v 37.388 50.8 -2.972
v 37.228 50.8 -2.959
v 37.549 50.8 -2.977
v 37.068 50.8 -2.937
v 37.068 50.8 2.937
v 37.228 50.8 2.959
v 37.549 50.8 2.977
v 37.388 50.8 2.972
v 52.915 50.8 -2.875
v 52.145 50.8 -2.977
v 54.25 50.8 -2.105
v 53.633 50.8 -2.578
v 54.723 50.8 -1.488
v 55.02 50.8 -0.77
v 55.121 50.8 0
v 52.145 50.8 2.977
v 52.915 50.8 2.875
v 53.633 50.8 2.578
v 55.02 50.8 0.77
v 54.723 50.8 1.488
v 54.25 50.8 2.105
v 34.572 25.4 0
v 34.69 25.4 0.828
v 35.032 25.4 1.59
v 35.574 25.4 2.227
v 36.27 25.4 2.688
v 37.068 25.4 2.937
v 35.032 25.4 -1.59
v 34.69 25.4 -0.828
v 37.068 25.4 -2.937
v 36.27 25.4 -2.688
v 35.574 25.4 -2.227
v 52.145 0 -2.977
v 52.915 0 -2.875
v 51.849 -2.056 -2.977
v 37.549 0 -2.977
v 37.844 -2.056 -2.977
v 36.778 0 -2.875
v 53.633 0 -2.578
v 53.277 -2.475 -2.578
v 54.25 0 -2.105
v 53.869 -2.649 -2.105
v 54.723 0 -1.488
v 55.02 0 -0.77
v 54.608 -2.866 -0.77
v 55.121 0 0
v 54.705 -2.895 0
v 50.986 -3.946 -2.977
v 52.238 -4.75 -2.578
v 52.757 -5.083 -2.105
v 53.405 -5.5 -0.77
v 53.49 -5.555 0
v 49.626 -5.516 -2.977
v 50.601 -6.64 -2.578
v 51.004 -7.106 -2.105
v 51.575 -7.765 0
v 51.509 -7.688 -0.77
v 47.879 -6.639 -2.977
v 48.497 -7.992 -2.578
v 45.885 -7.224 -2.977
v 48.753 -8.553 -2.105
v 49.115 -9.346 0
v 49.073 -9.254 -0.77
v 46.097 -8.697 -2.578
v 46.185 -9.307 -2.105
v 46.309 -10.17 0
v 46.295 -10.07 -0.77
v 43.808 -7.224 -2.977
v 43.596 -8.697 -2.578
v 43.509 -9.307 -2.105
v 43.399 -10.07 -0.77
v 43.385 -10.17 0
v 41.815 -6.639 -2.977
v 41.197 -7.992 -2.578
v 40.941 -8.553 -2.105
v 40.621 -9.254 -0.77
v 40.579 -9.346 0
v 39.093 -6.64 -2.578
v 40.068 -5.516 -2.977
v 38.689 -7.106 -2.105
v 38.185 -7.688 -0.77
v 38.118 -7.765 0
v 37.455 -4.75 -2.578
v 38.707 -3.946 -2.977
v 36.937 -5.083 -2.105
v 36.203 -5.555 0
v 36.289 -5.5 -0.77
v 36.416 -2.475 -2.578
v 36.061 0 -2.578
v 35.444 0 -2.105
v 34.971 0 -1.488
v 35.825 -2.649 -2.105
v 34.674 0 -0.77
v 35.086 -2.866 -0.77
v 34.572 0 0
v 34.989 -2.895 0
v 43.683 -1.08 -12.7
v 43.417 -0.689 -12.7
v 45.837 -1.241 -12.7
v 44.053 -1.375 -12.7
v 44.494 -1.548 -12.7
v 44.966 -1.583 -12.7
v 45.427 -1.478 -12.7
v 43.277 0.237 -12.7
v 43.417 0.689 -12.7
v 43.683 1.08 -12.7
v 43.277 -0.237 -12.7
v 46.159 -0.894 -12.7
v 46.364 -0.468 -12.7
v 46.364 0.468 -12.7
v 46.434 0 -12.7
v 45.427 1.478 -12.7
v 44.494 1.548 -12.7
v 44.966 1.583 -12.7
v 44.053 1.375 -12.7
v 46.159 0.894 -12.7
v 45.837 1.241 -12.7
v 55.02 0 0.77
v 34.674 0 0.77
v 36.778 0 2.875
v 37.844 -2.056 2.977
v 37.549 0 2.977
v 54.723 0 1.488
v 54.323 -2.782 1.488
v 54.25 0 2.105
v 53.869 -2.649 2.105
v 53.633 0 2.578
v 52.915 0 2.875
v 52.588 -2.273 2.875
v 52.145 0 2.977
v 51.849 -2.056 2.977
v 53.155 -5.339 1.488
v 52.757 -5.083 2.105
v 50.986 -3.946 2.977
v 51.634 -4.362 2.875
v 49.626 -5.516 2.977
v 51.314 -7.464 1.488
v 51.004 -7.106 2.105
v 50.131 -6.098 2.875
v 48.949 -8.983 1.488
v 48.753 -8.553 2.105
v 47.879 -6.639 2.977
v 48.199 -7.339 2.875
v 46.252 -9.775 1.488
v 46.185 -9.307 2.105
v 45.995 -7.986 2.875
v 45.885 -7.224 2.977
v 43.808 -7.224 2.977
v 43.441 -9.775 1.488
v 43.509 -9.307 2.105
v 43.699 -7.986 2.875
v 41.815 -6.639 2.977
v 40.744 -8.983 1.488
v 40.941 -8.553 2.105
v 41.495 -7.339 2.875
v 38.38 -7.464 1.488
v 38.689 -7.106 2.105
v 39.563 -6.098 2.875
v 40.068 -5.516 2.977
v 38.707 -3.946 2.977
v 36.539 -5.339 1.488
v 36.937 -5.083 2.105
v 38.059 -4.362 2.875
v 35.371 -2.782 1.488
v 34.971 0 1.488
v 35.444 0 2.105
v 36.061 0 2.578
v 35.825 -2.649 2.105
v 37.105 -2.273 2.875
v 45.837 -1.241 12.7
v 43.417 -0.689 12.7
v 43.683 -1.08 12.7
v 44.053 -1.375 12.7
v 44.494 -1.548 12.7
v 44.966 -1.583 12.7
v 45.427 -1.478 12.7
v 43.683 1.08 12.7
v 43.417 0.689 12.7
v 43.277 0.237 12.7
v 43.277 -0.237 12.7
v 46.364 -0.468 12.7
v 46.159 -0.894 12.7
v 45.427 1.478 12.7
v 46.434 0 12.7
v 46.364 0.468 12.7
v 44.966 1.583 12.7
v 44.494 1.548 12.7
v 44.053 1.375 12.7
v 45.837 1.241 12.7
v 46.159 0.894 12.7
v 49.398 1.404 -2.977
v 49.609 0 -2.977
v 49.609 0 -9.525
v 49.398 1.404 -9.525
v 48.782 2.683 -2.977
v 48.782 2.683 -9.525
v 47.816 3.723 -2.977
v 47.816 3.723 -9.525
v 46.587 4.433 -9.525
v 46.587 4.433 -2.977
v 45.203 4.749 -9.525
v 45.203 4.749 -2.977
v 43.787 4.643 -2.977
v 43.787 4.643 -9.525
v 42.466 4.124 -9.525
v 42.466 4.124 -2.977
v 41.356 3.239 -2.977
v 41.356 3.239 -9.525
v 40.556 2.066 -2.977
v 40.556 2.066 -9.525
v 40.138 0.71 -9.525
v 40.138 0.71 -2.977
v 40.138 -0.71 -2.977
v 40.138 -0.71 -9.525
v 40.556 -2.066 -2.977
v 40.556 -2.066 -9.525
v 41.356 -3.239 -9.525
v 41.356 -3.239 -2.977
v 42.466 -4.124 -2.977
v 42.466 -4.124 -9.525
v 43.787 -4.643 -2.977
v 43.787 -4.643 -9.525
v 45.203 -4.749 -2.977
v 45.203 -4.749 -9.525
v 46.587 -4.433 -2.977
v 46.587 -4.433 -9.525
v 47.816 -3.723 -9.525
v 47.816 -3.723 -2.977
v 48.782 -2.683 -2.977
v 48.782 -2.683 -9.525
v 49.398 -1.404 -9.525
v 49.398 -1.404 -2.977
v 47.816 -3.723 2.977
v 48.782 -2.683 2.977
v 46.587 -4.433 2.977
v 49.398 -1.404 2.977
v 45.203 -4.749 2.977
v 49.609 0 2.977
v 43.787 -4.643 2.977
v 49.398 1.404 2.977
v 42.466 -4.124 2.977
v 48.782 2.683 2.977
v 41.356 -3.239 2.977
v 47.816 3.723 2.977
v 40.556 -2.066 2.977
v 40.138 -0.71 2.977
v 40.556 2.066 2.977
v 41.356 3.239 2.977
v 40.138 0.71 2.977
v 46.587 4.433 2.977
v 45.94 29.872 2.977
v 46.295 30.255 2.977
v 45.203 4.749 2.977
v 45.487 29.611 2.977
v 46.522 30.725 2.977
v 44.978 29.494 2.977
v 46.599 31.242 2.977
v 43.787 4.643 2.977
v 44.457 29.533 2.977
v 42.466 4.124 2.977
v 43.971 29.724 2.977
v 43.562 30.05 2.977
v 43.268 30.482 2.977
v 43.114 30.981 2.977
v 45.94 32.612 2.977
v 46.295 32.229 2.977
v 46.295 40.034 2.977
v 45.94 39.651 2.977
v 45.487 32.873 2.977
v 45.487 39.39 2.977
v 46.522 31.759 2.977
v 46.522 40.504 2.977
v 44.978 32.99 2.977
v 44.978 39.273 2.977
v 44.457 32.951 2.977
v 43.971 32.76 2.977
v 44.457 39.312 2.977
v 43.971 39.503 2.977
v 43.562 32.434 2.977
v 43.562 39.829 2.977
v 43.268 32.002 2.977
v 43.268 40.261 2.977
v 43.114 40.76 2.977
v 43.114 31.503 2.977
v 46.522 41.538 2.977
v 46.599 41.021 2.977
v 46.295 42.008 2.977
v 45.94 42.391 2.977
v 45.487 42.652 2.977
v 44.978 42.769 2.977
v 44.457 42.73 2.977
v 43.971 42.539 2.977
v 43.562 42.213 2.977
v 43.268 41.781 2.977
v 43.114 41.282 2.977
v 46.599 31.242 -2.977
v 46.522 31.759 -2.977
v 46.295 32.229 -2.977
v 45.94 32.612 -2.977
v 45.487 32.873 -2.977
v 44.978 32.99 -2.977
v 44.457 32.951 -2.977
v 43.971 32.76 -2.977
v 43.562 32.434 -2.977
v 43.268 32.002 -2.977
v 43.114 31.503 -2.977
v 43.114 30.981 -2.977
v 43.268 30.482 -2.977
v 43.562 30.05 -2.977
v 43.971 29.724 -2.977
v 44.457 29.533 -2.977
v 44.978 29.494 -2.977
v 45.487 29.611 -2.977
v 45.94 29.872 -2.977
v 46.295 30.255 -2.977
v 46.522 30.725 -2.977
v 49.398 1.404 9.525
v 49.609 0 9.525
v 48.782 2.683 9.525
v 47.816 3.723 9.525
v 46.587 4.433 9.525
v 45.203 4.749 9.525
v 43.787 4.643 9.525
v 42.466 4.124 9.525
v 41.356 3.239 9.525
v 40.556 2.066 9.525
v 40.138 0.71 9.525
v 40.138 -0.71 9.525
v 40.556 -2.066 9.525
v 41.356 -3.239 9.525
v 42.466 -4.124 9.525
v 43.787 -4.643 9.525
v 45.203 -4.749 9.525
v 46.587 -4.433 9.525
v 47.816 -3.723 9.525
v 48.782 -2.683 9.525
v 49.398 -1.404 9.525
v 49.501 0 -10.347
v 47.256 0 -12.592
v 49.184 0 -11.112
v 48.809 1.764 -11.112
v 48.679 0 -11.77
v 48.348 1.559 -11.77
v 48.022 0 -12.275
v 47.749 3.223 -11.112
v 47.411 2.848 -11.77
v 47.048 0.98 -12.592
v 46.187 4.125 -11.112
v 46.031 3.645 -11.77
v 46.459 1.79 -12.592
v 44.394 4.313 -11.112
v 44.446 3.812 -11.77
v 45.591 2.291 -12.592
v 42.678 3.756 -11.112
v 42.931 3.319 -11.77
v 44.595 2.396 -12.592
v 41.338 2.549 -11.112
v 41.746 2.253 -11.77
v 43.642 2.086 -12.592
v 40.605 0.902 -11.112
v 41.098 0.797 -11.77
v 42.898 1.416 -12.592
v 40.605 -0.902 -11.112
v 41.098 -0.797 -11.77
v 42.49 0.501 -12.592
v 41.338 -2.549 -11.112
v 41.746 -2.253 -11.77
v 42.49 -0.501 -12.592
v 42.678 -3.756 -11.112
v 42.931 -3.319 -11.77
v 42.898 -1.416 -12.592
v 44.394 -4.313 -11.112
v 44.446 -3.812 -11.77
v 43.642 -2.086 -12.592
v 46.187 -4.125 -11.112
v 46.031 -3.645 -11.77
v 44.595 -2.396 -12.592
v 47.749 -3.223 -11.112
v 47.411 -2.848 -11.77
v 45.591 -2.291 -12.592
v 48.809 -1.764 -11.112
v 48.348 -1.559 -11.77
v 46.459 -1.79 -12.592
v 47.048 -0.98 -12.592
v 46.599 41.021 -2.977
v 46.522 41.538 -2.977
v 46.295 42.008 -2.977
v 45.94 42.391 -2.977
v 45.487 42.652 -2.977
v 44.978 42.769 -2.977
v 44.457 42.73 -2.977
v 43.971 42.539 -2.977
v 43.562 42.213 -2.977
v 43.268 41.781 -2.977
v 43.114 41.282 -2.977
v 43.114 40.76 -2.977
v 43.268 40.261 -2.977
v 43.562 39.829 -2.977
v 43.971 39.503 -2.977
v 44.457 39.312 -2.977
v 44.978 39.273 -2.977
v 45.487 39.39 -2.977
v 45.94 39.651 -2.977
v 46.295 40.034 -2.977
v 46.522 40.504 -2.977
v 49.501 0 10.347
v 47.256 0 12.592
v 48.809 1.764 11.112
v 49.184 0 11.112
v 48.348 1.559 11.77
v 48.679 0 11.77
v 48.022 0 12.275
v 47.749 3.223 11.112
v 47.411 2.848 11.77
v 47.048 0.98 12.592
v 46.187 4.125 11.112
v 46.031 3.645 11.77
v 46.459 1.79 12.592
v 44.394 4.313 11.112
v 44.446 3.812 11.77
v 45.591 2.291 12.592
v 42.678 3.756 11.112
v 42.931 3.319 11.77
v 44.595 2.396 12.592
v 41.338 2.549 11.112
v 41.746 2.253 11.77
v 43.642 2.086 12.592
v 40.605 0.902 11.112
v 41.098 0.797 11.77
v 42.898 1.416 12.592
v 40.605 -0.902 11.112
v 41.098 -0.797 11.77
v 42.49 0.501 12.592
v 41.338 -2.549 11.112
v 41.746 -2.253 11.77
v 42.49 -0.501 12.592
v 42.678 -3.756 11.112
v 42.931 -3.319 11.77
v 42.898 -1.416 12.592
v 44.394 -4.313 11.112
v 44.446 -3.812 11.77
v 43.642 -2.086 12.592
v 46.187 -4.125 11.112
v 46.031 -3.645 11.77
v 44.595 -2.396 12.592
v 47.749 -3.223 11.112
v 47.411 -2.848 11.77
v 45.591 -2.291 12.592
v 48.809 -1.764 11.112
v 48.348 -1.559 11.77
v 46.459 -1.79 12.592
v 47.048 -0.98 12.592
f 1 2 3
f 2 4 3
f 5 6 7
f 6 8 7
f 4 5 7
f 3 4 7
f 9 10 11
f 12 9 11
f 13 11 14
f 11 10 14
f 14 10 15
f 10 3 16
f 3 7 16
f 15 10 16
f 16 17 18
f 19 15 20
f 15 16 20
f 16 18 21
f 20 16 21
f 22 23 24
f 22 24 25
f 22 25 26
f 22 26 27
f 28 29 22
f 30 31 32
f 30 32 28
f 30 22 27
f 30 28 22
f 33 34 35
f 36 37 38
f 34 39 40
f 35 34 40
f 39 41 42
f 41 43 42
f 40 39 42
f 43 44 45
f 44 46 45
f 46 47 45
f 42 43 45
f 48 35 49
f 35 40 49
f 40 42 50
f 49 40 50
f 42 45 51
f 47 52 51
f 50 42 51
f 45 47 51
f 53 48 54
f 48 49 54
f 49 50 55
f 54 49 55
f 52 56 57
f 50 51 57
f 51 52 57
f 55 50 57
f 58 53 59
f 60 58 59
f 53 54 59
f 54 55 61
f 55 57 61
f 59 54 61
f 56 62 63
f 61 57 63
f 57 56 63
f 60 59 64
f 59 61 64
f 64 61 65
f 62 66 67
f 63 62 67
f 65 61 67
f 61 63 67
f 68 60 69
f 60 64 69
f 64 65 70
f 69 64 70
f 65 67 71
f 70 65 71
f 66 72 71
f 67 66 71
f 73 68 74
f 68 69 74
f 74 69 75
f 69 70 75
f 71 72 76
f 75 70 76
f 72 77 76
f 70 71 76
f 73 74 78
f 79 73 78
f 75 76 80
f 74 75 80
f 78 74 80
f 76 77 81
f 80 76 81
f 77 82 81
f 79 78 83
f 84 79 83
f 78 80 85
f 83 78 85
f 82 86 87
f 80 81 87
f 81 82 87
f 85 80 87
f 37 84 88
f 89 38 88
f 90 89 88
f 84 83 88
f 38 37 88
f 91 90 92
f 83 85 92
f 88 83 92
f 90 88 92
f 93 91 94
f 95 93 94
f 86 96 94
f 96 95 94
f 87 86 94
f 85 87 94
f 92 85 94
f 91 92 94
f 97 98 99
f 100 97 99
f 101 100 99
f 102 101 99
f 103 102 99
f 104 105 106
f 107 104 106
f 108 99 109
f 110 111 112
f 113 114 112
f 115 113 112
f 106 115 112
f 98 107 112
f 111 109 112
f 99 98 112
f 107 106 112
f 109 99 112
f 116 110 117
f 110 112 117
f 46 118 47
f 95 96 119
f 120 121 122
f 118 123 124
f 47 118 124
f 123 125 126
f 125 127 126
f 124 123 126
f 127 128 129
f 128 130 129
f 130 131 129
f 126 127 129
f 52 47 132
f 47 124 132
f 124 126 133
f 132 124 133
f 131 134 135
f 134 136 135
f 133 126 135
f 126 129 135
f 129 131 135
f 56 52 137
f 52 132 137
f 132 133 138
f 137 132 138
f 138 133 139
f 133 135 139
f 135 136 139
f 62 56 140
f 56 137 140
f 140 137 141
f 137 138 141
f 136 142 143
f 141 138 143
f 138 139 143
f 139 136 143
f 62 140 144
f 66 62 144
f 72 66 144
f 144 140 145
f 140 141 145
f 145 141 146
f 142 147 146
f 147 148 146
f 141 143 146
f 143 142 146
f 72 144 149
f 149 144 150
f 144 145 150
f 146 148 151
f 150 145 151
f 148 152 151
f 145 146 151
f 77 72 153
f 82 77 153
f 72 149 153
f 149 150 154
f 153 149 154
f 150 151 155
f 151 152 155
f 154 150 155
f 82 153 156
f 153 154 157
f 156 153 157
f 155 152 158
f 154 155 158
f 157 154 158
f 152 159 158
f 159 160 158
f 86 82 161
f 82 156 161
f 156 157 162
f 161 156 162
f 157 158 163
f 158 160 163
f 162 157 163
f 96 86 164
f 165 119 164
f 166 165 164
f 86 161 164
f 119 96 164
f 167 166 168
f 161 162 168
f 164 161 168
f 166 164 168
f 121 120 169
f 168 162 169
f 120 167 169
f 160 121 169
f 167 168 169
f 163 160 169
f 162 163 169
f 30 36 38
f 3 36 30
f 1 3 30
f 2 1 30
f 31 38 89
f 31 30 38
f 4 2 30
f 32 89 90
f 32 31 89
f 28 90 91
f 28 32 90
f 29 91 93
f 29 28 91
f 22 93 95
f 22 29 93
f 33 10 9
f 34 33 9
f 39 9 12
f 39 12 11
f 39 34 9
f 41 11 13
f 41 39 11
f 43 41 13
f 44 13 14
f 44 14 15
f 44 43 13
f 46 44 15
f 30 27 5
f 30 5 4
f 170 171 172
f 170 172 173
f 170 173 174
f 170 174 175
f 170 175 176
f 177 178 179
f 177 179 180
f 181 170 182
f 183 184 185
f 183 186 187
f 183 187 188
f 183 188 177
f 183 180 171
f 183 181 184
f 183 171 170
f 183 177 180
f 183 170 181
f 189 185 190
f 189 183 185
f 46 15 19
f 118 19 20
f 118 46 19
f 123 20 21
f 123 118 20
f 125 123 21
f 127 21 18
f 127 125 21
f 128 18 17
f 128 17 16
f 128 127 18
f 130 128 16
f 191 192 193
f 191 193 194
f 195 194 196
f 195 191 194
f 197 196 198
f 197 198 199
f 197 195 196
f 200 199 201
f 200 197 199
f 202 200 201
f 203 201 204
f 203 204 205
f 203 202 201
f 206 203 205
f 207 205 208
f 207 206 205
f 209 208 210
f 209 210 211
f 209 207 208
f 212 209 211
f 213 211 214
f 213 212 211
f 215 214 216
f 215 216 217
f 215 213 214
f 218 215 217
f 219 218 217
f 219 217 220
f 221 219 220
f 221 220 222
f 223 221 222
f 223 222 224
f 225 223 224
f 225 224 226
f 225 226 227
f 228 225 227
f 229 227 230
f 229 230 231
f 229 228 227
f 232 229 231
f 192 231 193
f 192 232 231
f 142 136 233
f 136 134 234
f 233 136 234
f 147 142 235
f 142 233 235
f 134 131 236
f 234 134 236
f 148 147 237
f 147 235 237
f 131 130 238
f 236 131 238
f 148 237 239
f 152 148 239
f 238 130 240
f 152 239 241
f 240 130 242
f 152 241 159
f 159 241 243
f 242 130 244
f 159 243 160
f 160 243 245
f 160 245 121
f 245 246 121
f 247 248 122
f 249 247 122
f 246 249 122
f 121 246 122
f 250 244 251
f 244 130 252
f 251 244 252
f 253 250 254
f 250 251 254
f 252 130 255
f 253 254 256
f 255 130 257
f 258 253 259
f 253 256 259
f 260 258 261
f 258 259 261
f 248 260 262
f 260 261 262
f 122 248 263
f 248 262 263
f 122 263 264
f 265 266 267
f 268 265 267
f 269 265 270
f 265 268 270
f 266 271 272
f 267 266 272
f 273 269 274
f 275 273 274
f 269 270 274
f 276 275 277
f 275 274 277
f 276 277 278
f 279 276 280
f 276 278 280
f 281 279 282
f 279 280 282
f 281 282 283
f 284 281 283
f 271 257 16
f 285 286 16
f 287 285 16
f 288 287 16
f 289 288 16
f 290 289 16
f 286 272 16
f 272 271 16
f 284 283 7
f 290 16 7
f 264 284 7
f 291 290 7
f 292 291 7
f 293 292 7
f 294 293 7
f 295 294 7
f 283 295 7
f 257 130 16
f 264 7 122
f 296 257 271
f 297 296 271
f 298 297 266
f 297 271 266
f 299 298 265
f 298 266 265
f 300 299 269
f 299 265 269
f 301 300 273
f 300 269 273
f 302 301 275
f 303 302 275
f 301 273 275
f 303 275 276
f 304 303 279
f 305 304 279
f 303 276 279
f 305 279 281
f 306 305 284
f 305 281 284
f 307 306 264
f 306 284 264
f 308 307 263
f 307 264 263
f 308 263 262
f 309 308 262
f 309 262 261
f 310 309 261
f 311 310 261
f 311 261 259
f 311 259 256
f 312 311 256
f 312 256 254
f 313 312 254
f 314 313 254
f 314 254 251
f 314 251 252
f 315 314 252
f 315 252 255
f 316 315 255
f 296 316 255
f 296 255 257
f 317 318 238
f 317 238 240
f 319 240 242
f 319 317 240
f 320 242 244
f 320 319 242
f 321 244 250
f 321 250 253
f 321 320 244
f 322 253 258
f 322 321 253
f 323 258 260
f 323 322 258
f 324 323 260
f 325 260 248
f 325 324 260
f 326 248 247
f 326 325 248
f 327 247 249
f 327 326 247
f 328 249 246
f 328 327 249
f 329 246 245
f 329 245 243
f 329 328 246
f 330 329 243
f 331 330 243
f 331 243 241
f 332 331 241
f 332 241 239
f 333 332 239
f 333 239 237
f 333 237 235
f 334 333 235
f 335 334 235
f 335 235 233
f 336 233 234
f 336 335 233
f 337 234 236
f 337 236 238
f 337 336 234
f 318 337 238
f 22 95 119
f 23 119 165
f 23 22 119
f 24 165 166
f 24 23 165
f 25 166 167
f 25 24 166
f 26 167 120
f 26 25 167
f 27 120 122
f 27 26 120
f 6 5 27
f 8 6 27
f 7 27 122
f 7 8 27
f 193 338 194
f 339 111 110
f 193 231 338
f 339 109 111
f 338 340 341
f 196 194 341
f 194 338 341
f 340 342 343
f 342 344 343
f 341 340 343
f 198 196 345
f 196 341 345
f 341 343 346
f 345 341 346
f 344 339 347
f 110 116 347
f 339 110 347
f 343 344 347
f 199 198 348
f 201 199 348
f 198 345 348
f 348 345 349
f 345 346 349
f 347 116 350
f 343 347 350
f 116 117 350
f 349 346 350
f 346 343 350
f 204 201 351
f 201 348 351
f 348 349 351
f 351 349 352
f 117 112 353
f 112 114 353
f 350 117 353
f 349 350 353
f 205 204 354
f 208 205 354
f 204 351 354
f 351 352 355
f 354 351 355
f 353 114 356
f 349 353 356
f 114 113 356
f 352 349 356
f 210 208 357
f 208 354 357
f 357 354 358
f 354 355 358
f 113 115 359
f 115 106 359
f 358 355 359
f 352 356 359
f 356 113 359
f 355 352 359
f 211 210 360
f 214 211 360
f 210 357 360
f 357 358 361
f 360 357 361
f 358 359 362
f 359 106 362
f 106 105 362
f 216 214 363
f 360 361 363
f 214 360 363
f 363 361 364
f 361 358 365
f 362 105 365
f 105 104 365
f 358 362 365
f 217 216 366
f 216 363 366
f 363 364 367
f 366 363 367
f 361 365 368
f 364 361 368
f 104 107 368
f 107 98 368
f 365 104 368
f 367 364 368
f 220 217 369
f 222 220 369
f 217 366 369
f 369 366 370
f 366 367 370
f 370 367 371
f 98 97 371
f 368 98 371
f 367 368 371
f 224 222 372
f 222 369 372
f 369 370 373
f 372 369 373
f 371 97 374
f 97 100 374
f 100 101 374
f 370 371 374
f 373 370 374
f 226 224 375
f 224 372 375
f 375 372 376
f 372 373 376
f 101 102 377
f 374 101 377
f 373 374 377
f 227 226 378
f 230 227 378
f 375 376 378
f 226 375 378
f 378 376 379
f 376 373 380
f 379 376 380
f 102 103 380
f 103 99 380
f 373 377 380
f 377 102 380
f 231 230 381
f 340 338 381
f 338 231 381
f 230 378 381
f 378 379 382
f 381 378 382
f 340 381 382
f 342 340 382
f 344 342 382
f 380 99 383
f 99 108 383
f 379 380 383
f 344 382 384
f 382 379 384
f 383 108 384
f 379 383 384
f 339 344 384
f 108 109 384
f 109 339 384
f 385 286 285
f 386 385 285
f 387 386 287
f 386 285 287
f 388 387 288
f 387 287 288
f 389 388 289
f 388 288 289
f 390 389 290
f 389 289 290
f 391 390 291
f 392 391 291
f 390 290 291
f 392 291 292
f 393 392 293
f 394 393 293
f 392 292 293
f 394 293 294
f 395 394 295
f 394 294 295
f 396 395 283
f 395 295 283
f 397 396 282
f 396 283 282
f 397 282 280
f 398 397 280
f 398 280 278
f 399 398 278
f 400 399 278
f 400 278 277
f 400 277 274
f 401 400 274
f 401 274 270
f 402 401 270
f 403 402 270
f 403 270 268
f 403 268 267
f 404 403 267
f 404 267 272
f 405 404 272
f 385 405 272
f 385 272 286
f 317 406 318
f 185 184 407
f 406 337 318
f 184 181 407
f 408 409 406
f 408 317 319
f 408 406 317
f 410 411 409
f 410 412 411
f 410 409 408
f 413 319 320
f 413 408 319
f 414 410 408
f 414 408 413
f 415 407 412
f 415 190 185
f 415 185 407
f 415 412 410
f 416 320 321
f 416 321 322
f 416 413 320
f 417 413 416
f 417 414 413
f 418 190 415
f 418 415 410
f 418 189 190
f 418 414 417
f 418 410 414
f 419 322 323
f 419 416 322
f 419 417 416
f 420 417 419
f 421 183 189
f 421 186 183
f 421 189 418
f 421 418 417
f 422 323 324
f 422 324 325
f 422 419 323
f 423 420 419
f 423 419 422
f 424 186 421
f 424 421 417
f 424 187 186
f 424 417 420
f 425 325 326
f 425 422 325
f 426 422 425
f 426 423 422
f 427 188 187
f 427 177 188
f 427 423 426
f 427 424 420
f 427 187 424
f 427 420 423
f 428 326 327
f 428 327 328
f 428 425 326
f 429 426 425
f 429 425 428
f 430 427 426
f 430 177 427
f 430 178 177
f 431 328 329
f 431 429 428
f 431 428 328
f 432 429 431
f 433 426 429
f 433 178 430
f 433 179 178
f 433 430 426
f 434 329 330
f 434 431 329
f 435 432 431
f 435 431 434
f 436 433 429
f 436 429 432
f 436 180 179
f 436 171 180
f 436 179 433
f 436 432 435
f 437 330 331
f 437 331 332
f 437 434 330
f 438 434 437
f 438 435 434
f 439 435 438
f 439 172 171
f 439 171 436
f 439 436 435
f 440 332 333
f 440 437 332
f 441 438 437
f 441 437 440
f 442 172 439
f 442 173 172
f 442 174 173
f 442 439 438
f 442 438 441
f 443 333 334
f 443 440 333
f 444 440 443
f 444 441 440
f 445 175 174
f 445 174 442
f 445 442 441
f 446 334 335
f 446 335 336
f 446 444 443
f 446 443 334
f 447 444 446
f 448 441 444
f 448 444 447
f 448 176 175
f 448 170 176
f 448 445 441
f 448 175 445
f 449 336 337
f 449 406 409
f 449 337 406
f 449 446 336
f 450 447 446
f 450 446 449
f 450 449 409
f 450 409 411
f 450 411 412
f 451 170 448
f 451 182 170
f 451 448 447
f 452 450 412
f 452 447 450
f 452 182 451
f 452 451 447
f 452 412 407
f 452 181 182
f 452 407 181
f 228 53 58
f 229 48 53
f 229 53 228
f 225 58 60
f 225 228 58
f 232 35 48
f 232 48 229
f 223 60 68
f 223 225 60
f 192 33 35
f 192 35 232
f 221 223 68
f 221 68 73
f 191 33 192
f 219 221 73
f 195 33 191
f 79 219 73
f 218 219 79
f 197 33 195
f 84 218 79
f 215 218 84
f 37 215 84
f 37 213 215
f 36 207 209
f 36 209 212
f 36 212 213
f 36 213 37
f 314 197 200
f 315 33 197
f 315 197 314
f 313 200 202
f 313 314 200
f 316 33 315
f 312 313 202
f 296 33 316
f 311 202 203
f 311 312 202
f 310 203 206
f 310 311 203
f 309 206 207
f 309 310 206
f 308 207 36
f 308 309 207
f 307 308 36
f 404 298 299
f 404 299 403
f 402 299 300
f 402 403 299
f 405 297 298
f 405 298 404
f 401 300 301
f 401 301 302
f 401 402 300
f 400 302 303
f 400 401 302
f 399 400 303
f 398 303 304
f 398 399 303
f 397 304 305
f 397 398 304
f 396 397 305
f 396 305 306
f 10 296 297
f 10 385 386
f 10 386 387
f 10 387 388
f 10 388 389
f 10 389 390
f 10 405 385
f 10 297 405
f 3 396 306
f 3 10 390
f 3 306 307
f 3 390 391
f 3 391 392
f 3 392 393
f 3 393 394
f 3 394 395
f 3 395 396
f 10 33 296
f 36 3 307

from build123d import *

# Parameters (mm, degrees)
SKETCH1_R             = 4.5640625
BOSS_EXTRUDE1_DEPTH   = 2.9765625
SKETCH2_R             = 4.7625
BOSS_EXTRUDE2_DEPTH   = 12.7
FILLET1_R             = 3.175
FILLET2_R             = 2.976563
SKETCH3_W             = 2.495765829
SKETCH3_H             = 5.953125
CUT_EXTRUDE1_DEPTH    = 25.4
F_6_32_TAPPED_HOLE1_D = 3.5052


with BuildPart() as part:
    # Sketch1 → Boss-Extrude1 (new, symmetric)
    with BuildSketch(Plane.XY):
        with BuildLine():
            Line((34.572359171, 0), (34.572359171, 50.8))
            Line((34.572359171, 50.8), (55.121390829, 50.8))
            Line((55.121390829, 50.8), (55.121390829, 0))
            ThreePointArc((55.121390829, 0), (44.846875, -10.274515829), (34.572359171, 0))
        make_face()
        with Locations((44.846875, 0)):
            Circle(SKETCH1_R, mode=Mode.SUBTRACT)
    extrude(amount=BOSS_EXTRUDE1_DEPTH, both=True)

    # Sketch2 → Boss-Extrude2 (add, symmetric)
    with BuildSketch(Plane.XY):
        with Locations((44.846875, 0)):
            Circle(SKETCH2_R)
    extrude(amount=BOSS_EXTRUDE2_DEPTH, both=True)

    # Fillet1
    fillet1_edges = [part.edges().sort_by_distance(p)[0] for p in [
        (40.084375, 0, -12.7),
        (40.084375, 0, 12.7),
    ]]
    fillet(fillet1_edges, radius=FILLET1_R)

    # Fillet2
    fillet2_edges = [part.edges().sort_by_distance(p)[0] for p in [
        (34.572359171, 25.4, 2.9765625),
        (44.846875, -10.274515829, 2.9765625),
        (34.572359171, 25.4, -2.9765625),
        (55.121390829, 25.4, -2.9765625),
        (55.121390829, 25.4, 2.9765625),
    ]]
    fillet(fillet2_edges, radius=FILLET2_R - 0.0001)  # a hair under: the kernel refuses the full size

    # Sketch3 → Cut-Extrude1 (cut)
    with BuildSketch(Plane(origin=(0, 50.8, 0), x_dir=(1, 0, 0), z_dir=(0, 1, 0))):
        with Locations((35.820242085, 0)):
            Rectangle(SKETCH3_W, SKETCH3_H)
    extrude(amount=-CUT_EXTRUDE1_DEPTH, mode=Mode.SUBTRACT)

    # #6-32 Tapped Hole1 (through all)
    with Locations(Plane(origin=(0, 0, -2.9765625), x_dir=(-1, 0, 0), z_dir=(0, 0, -1))):
        with Locations((-44.846875, 41.021), (-44.846875, 31.242)):
            Hole(F_6_32_TAPPED_HOLE1_D / 2)


solid = part.part
